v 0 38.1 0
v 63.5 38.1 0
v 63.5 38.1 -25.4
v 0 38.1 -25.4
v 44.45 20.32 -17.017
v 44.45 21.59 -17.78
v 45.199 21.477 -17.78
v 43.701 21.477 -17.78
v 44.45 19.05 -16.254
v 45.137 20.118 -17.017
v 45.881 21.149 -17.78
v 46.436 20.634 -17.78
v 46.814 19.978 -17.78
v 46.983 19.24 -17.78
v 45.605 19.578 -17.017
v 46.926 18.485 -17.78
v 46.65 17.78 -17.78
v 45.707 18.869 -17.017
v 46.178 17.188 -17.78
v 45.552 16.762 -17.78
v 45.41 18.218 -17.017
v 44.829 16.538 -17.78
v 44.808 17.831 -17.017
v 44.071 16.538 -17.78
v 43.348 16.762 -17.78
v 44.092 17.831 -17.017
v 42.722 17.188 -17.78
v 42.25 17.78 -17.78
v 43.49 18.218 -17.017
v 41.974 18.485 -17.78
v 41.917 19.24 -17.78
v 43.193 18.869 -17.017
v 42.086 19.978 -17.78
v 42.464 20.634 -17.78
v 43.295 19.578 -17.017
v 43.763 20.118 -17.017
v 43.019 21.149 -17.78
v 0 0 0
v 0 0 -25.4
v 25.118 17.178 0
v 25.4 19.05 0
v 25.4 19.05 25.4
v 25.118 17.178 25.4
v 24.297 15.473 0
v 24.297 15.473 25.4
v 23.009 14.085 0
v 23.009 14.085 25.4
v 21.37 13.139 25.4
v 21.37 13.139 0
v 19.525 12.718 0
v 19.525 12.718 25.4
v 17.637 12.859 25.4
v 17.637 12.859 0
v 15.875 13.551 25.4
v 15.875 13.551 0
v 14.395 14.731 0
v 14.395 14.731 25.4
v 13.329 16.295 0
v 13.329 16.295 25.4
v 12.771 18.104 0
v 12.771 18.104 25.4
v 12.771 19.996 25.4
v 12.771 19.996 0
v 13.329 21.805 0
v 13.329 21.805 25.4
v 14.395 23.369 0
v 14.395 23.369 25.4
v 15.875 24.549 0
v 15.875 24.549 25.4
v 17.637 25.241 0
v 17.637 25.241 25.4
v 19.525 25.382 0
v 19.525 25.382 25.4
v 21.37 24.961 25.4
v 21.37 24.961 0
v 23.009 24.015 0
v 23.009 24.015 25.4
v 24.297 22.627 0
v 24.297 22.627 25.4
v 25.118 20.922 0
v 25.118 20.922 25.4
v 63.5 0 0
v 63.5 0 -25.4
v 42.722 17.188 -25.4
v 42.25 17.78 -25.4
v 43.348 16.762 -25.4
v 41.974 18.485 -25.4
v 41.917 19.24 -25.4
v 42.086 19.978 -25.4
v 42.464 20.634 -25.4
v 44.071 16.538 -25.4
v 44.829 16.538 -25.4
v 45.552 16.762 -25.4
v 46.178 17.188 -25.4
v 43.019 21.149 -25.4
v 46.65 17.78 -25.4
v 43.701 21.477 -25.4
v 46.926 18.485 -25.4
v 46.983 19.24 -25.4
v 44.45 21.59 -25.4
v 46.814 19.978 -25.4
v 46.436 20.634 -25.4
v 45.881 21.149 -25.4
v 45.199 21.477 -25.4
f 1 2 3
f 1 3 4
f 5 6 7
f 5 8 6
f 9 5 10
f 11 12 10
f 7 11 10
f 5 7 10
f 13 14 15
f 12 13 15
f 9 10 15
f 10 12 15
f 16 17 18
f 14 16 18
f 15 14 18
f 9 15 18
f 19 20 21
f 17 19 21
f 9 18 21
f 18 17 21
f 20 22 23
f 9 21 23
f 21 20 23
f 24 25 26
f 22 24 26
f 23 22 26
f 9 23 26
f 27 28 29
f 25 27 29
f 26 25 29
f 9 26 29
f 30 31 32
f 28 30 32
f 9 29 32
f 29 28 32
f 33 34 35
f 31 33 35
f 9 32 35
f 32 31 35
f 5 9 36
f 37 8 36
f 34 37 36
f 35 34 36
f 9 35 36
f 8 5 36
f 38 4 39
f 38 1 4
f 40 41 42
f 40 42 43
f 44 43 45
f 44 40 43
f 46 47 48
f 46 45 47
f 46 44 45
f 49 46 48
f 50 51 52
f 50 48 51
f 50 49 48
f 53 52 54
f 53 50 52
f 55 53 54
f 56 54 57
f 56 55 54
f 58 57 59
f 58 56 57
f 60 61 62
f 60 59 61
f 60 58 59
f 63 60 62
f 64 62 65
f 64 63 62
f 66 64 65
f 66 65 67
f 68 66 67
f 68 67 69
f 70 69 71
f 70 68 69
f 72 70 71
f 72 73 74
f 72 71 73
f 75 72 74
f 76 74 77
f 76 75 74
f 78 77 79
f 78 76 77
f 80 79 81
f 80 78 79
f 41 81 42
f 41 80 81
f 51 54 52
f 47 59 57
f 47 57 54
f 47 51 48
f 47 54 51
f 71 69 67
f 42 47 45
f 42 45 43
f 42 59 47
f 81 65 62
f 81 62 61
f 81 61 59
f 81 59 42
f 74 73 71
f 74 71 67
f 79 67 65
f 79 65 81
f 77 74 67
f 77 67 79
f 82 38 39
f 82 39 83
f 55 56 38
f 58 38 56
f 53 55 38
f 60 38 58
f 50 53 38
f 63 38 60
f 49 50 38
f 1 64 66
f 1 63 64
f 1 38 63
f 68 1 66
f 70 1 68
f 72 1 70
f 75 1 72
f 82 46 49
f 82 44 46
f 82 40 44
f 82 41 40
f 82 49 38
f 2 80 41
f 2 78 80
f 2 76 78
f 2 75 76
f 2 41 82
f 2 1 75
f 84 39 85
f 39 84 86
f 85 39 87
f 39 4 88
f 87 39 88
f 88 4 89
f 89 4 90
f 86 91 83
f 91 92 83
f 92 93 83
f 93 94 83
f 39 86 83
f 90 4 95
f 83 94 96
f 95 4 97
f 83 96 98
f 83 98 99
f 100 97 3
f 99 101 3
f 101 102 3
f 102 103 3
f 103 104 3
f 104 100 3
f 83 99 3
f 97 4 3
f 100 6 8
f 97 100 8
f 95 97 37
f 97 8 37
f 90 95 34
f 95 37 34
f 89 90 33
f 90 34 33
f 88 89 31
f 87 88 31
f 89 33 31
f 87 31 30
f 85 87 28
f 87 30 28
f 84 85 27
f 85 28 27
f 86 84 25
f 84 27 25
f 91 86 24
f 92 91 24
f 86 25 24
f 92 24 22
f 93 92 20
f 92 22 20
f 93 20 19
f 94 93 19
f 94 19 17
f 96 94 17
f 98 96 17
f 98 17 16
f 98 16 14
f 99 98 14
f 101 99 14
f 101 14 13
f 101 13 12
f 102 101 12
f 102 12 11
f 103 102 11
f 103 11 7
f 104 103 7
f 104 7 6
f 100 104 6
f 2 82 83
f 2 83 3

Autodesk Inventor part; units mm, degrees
ref_plane "YZ Plane" through (0, 0, 0) normal (1, 0, 0) x (0, 1, 0)
ref_plane "XZ Plane" through (0, 0, 0) normal (0, 1, 0) x (-1, 0, 0)
ref_plane "XY Plane" through (0, 0, 0) normal (0, 0, 1) x (1, 0, 0)
sketch "Sketch1" plane through (0, 0, 0) normal (0, 0, 1) x (1, 0, 0)
  line L0 (0, 0) -> (63.5, 0)
  line L1 (63.5, 0) -> (63.5, 38.1)
  line L2 (63.5, 38.1) -> (0, 38.1)
  line L3 (0, 38.1) -> (0, 0)
  circle A0 centre (19.05, 19.05) radius 6.35
  dimension "d0" = 63.5
  dimension "d1" = 38.1
  dimension "d4" = 19.05
  dimension "d5" = 12.7
extrude "Extrusion1" add sketch "Sketch1" against normal blind 25.4 contours L3 L2 L1 L0 | A0
extrude "Extrusion2" add sketch "Sketch1" along normal blind 25.4 contours A0
sketch "Sketch2" plane through (0, 0, -25.4) normal (0, 0, -1) x (-1, 0, 0)
  line L0 (-63.5, 0) -> (-63.5, 38.1) projected
  circle A0 centre (-44.45, 19.05) radius 8.4036
  dimension "d8" = 19.05
hole "Hole1" at (44.45, 19.05, -25.4) direction (0, 0, 1) diameter 5.08 depth 7.62 tip angle 118
properties part number "proxycimulator775"
